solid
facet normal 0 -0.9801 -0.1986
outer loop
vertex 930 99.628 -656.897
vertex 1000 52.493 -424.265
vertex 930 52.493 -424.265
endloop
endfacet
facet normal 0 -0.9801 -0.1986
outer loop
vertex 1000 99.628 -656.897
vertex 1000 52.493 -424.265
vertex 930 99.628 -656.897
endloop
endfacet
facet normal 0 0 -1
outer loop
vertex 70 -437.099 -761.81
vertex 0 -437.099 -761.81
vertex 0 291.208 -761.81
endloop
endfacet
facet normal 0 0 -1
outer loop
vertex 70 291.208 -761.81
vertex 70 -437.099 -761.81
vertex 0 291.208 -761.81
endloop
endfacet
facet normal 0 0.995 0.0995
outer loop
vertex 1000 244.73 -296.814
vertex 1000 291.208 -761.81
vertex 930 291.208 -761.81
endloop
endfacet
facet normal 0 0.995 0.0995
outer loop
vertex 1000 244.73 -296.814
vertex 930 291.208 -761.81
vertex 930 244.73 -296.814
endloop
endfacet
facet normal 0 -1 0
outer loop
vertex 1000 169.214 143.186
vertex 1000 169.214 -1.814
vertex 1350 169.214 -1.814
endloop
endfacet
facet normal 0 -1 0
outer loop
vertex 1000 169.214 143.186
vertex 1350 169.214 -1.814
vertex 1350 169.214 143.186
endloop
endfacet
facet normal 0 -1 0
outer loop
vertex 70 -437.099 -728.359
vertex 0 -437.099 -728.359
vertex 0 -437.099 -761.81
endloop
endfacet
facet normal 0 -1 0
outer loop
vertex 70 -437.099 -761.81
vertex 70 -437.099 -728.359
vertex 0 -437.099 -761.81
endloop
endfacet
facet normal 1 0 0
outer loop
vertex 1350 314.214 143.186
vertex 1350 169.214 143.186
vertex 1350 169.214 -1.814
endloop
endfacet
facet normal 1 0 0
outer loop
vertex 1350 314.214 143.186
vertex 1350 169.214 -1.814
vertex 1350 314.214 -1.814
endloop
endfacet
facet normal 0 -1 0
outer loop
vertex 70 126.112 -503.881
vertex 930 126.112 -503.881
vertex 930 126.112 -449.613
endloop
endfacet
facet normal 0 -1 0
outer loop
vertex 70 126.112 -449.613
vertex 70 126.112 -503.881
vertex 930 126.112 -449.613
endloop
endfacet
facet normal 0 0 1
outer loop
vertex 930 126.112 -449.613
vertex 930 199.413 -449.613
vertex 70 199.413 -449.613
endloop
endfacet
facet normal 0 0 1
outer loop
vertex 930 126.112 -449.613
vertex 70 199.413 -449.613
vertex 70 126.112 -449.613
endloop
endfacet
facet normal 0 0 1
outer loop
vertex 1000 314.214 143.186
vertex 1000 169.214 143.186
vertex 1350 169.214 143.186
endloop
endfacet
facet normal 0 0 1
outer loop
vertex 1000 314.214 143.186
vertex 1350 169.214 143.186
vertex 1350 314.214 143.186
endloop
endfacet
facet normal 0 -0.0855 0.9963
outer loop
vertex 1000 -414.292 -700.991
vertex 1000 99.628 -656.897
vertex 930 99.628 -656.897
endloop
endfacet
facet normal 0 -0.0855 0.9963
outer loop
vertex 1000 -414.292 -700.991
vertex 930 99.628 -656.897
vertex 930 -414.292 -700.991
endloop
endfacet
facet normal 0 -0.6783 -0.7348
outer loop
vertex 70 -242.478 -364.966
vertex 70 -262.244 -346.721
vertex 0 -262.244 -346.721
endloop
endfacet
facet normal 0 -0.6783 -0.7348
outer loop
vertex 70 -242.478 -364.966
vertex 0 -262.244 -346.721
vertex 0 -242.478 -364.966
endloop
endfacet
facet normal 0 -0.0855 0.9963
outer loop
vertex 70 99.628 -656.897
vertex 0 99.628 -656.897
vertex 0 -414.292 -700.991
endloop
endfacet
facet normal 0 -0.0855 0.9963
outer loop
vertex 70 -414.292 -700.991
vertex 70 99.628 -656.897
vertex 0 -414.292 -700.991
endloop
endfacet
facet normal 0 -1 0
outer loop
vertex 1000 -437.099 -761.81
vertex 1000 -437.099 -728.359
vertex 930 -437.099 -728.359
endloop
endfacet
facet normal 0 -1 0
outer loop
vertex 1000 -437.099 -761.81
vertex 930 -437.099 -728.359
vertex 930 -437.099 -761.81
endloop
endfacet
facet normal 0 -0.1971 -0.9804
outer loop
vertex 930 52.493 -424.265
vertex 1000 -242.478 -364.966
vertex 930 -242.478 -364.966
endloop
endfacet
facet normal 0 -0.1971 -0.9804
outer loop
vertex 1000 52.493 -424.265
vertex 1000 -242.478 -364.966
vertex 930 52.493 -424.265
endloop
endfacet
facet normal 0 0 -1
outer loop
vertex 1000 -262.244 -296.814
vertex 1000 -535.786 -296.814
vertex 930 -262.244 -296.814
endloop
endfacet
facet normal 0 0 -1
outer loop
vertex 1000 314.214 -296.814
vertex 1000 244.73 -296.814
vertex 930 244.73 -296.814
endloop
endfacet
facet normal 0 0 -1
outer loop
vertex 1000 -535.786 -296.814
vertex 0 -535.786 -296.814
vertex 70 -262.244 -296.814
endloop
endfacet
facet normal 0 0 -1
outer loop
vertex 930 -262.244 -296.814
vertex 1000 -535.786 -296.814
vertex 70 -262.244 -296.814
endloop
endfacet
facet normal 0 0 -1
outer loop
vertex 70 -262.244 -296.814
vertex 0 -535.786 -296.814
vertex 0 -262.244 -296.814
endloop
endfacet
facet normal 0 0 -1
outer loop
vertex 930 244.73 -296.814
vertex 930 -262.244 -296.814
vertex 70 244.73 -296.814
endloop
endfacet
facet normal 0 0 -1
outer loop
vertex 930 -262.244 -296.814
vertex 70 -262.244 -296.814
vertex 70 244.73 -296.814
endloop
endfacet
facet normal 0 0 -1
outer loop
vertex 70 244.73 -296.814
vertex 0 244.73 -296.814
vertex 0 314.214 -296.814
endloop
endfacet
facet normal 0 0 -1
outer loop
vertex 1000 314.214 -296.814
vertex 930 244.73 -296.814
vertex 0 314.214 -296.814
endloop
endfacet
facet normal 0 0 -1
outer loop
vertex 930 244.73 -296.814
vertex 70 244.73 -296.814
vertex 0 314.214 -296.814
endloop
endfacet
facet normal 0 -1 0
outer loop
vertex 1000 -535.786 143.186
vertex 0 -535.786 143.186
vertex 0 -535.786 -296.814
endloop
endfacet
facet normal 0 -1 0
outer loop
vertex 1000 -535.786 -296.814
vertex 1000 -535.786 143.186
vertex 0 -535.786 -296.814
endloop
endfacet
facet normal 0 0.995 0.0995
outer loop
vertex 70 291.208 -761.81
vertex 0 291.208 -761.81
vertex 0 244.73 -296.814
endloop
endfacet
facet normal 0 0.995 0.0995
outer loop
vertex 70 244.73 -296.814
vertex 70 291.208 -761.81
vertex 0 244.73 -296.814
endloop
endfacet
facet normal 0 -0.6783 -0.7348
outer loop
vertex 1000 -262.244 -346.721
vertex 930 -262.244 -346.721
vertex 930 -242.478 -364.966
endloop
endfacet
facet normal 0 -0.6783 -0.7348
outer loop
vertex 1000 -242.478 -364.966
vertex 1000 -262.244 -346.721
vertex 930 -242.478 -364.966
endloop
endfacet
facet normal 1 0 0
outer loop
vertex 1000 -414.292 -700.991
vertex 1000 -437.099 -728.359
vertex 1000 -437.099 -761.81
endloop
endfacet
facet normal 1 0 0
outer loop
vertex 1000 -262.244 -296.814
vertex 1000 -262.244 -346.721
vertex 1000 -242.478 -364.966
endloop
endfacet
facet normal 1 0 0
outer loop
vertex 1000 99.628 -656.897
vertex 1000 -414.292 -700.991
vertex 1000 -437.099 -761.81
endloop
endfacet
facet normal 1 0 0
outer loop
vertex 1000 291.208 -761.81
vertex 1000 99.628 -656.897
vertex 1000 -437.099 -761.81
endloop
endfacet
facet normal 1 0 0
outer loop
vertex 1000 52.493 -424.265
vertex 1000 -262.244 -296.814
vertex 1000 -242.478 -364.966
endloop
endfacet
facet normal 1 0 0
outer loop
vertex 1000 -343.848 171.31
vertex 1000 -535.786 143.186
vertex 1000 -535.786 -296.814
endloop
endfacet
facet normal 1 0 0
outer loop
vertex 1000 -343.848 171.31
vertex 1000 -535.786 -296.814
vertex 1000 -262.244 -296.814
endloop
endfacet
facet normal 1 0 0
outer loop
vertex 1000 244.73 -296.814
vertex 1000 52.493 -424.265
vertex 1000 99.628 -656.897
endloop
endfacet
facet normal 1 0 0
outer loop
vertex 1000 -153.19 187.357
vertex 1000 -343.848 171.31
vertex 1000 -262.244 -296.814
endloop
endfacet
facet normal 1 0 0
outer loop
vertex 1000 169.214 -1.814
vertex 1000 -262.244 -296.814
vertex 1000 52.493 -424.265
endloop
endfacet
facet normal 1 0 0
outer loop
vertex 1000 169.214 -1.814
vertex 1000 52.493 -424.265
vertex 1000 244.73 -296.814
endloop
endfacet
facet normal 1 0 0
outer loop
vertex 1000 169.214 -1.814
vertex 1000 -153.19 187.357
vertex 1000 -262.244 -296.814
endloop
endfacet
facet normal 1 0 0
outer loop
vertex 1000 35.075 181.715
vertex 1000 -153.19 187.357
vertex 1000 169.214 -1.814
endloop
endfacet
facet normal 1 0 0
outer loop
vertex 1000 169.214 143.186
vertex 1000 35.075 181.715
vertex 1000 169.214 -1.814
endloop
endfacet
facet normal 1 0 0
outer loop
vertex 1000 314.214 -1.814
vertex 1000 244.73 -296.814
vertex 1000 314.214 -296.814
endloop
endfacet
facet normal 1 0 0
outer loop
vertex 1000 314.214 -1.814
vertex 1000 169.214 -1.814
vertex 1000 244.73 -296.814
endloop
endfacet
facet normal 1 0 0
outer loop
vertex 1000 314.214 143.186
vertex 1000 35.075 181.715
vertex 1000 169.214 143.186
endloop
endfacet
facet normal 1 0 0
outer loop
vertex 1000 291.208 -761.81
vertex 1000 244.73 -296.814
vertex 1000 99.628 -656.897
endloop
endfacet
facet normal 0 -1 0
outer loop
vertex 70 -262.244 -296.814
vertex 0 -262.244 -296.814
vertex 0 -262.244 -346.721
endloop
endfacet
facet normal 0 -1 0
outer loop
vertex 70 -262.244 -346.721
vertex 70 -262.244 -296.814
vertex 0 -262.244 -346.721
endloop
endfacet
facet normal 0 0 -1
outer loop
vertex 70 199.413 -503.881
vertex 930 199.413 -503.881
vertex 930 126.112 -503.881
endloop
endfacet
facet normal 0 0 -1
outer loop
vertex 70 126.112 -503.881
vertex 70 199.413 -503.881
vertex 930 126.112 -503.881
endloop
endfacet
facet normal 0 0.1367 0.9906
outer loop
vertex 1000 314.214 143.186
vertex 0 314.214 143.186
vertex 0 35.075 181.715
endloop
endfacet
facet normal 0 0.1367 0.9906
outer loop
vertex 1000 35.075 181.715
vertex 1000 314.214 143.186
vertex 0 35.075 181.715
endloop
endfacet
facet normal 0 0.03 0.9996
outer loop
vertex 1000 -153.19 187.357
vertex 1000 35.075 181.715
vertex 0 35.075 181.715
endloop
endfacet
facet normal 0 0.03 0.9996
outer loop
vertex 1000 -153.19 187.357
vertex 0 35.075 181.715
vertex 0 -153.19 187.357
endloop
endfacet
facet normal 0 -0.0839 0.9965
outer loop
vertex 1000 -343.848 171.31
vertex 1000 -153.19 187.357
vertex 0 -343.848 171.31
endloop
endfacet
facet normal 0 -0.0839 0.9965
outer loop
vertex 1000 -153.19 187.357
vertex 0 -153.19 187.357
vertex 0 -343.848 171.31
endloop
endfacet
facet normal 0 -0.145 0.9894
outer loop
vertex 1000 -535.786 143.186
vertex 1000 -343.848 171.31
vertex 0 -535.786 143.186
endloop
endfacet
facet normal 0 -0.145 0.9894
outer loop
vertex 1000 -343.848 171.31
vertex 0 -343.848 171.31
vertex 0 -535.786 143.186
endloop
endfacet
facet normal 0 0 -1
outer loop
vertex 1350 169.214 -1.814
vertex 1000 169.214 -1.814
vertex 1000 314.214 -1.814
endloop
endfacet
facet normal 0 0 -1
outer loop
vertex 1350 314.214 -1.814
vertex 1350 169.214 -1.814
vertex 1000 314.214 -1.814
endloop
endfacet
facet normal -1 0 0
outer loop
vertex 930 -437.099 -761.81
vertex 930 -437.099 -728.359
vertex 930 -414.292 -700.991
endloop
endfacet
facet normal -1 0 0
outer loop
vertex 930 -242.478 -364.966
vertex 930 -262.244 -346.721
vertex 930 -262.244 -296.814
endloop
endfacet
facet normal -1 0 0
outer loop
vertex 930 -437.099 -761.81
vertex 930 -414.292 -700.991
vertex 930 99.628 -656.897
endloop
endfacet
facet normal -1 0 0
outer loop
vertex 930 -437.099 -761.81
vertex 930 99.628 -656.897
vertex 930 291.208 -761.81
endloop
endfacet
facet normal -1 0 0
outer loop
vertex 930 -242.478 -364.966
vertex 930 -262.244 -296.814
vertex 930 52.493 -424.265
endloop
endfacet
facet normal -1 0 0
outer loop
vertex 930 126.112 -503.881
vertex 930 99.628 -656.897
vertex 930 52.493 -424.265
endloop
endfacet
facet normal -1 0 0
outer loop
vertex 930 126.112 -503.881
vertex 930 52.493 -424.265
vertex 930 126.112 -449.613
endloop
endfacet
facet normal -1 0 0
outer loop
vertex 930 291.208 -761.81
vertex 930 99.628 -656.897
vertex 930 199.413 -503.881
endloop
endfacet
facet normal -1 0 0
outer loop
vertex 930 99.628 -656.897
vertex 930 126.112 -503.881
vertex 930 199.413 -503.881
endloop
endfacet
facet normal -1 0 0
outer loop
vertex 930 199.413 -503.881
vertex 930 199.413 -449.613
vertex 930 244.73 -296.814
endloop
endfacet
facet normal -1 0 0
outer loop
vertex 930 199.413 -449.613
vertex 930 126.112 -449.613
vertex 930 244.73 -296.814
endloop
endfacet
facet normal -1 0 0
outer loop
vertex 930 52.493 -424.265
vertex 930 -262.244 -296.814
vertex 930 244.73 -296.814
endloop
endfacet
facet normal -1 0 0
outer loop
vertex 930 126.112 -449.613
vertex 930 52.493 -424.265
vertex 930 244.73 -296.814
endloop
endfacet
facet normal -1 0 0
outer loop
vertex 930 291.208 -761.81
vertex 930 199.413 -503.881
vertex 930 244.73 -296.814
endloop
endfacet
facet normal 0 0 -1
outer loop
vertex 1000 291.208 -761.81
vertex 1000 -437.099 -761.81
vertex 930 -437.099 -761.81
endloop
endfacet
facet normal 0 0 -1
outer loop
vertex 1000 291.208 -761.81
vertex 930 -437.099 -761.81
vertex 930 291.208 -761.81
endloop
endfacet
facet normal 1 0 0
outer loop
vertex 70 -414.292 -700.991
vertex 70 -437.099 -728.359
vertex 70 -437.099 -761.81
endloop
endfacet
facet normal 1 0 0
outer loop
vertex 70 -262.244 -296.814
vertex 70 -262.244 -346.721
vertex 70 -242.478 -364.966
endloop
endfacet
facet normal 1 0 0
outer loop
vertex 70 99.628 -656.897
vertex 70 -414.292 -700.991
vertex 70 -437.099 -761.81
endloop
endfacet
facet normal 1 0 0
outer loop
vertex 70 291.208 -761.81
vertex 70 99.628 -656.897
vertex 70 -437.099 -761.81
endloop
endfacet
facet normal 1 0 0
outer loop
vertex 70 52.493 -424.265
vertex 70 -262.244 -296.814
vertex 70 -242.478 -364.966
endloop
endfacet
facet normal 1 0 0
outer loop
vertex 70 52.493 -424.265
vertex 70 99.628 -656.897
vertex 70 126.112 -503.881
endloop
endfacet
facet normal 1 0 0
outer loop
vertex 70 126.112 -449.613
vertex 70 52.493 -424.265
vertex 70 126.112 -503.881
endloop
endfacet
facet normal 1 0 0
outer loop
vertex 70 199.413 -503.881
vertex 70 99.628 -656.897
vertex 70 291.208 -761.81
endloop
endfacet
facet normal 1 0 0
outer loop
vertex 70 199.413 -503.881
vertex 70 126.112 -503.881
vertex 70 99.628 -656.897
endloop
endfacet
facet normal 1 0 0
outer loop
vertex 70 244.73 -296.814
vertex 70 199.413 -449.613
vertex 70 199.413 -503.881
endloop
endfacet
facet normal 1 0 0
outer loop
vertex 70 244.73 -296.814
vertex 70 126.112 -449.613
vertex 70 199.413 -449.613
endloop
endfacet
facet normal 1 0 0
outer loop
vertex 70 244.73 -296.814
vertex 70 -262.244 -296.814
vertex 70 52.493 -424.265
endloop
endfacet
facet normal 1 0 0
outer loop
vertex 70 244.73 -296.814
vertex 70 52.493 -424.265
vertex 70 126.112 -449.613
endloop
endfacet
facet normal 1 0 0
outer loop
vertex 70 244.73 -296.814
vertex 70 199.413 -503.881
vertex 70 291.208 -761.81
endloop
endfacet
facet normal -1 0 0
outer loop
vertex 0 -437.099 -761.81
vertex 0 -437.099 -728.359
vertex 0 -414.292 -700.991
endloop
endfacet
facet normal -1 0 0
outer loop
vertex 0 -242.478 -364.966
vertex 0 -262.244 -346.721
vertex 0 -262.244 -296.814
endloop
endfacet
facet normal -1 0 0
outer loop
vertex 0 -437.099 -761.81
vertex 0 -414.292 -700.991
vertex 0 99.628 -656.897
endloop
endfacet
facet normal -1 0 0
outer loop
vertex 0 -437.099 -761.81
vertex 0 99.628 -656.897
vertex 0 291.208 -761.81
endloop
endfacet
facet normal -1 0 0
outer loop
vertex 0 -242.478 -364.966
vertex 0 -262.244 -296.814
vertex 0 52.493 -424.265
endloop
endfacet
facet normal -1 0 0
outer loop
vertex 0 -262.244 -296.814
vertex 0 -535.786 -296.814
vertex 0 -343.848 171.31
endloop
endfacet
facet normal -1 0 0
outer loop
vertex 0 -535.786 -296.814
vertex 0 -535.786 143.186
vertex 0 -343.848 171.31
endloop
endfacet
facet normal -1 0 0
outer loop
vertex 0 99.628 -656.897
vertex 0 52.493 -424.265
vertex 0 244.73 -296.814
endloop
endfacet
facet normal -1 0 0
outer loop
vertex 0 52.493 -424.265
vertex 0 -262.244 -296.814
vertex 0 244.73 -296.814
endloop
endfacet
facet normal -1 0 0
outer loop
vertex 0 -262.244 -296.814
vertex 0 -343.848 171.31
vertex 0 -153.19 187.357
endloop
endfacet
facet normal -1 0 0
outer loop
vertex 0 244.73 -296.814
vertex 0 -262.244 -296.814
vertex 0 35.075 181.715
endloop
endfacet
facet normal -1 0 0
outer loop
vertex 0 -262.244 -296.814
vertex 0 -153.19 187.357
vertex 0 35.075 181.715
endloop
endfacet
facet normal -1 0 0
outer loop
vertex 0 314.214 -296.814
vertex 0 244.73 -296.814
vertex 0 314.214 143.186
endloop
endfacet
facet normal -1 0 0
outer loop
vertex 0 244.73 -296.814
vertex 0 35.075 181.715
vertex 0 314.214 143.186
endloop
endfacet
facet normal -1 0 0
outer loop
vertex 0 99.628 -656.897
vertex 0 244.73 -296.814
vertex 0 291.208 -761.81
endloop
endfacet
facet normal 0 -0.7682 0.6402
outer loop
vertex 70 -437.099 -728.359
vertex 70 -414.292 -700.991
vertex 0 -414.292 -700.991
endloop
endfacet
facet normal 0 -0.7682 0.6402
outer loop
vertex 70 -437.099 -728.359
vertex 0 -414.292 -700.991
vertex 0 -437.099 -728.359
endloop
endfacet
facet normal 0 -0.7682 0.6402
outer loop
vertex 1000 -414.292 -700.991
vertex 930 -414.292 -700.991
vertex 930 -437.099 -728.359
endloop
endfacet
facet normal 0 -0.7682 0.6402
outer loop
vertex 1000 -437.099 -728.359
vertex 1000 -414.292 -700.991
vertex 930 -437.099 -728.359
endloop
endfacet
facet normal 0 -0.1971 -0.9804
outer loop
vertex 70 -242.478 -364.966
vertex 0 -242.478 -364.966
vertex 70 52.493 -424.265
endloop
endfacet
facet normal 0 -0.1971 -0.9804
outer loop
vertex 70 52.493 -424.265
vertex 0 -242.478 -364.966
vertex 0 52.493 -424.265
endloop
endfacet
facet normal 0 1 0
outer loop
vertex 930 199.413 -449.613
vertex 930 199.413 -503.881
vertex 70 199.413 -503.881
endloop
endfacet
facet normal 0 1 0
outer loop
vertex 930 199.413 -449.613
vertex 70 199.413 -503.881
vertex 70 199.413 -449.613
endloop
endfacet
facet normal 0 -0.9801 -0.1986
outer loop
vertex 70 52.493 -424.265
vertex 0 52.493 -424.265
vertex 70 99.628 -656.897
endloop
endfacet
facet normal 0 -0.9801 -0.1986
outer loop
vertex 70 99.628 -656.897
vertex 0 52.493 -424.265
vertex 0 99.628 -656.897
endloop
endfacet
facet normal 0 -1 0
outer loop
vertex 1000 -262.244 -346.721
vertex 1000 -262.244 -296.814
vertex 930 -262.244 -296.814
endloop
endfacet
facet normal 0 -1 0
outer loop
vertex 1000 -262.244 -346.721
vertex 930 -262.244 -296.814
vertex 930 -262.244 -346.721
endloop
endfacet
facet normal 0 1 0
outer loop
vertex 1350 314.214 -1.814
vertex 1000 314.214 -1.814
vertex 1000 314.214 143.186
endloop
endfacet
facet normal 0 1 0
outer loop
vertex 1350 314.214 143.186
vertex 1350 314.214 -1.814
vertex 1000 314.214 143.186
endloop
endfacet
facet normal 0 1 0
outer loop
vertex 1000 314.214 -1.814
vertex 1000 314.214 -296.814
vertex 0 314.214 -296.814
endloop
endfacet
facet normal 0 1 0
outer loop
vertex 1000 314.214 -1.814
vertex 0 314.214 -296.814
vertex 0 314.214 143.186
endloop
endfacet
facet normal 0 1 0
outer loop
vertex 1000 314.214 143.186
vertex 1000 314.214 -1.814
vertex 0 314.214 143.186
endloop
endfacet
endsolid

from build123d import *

# Parameters (mm, degrees)
F1_DEPTH = 1000
F2_W     = 145
F2_H     = 145
F3_DEPTH = 350
F5_DEPTH = 70
F8_W     = 73.3011215925
F8_H     = 54.268091917
F9_DEPTH = 860


with BuildPart() as f1:
    # F0 (on Right) → F1 (new body)
    with BuildSketch(Plane.YZ):
        with BuildLine():
            Line((-535.786010325, -296.8136846698), (314.213989675, -296.8136846698))
            Line((314.213989675, -296.8136846698), (314.213989675, 143.1863153302))
            add(Edge.make_bspline(
                [(314.213989675, 143.1863153302), (176.5867674254, 165.9648621816), (-101.8189451009, 210.2443102405), (-390.0428643628, 166.3108724655), (-535.786010325, 143.1863153302)],
                knots=[0, 0, 0, 0, 0.4943481252, 1, 1, 1, 1], degree=3))
            Line((-535.786010325, 143.1863153302), (-535.786010325, -296.8136846698))
        make_face()
    extrude(amount=F1_DEPTH)

    # F2 (on face) → F3 (join)
    with BuildSketch(Plane.YZ.offset(1000)):
        with Locations((241.713989675, 70.6863153302)):
            Rectangle(F2_W, F2_H)
    extrude(amount=F3_DEPTH)

    # F7: F5 across plane


with BuildPart() as f5:
    # F4 (on face) → F5 (new body)
    with BuildSketch(Plane.YZ.offset(1000)):
        Polygon((291.2076711655, -761.8098408201), (244.7297275066, -296.8136846698), (-262.2444331646, -296.8136846698), (-262.2444331646, -346.7207700231), (-242.4782663584, -364.9664670446), (52.4934381247, -424.2648929575), (99.6281057596, -656.8972617605), (-414.2917096615, -700.9909302213), (-437.098801136, -728.3594757536), (-437.098801136, -761.8098408201), align=None)
    extrude(amount=-F5_DEPTH)


with BuildPart() as f1_1:
    add(f1.part)
    add(f5.part.mirror(Plane(origin=(500, -120.4719590478, -66.200953195), x_dir=(0, 1, 0), z_dir=(-1, 0, 0))))


    add(f5.part)  # F9 merges F5
    # F8 (on face) → F9 (join, through all)
    with BuildSketch(Plane(origin=(930, 0, 0), x_dir=(0, -1, 0), z_dir=(-1, 0, 0))):
        with Locations((-162.7628132701, -476.7469912767)):
            Rectangle(F8_W, F8_H)
    extrude(amount=F9_DEPTH)


solid = f1_1.part
